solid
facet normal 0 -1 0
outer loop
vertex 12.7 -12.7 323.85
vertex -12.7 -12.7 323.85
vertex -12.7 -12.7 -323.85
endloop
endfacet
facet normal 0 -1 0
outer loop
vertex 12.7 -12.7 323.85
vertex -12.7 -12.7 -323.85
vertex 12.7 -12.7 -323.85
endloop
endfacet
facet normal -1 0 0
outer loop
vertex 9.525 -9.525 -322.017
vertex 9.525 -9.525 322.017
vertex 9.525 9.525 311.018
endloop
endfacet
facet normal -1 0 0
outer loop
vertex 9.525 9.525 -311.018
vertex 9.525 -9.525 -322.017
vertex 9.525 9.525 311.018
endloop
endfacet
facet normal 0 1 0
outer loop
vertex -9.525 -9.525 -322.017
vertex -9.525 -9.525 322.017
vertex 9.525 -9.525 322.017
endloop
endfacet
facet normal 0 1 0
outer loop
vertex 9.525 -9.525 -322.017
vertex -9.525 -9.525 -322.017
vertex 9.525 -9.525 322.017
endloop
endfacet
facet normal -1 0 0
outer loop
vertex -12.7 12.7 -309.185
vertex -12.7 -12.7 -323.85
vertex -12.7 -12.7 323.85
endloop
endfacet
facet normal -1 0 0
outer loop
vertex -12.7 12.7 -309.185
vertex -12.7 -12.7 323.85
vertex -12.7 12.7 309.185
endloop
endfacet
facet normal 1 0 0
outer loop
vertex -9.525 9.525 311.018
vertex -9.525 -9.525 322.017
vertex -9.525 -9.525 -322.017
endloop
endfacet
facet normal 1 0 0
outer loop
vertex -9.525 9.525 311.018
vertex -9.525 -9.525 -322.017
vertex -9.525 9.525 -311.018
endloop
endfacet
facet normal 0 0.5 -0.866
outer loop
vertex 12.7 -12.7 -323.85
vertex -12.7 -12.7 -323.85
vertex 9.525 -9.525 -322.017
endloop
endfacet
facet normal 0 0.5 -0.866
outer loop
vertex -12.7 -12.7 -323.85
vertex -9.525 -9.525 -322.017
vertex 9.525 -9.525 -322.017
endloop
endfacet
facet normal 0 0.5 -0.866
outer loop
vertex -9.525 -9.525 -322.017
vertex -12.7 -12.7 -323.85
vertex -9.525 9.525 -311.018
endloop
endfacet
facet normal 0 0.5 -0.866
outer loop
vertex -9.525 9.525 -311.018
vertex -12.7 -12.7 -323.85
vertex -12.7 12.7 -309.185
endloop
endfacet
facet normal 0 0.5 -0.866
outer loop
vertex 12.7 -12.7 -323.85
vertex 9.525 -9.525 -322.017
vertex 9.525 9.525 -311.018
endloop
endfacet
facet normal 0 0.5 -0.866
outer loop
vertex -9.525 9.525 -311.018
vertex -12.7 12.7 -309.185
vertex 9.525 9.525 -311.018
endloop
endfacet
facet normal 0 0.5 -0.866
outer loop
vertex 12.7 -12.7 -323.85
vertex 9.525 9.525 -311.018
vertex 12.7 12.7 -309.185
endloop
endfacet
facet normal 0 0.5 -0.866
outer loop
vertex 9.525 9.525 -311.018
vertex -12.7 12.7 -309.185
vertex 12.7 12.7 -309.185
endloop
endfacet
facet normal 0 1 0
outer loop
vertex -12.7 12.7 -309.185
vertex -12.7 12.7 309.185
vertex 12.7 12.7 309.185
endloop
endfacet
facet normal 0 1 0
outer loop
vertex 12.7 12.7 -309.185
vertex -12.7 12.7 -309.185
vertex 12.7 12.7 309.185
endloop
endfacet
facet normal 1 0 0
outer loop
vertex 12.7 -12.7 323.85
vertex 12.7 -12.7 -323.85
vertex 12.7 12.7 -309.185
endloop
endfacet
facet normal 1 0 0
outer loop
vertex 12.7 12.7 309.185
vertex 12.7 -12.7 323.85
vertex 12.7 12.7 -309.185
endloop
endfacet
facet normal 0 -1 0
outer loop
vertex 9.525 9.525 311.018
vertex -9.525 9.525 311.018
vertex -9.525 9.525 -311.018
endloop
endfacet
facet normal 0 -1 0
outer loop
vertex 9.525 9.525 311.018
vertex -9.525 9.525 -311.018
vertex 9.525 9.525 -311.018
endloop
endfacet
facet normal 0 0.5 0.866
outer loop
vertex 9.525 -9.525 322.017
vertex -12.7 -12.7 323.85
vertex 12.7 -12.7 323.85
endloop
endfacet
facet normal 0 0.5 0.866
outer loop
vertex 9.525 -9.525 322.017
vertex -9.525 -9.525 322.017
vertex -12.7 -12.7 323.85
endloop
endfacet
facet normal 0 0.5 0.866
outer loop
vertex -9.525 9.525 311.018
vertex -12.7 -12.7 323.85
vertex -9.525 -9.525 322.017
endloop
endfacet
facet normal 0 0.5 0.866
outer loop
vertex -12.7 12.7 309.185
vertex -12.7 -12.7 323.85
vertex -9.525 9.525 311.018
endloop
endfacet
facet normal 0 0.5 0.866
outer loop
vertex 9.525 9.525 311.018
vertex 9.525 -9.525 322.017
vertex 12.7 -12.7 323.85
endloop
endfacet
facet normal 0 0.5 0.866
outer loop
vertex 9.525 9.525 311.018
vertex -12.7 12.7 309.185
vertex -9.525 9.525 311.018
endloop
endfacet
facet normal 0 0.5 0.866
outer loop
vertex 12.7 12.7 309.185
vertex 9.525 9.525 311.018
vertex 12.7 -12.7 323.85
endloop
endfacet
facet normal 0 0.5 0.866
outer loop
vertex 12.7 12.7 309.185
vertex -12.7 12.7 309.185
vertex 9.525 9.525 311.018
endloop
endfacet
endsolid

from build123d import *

# Parameters (mm, degrees)
SKETCH1_W           = 25.4
SKETCH1_H           = 25.4
SKETCH1_W_2         = 19.05
SKETCH1_H_2         = 19.05
BOSS_EXTRUDE1_DEPTH = 323.85
SKETCH2_W           = 25.4
SKETCH2_H           = 29.329393675
CUT_EXTRUDE1_DEPTH  = 281.965076789


with BuildPart() as part:
    # Sketch1 → Boss-Extrude1 (new body)
    with BuildSketch(Plane.XY):
        Rectangle(SKETCH1_W, SKETCH1_H)
        Rectangle(SKETCH1_W_2, SKETCH1_H_2, mode=Mode.SUBTRACT)
    boss_extrude1 = extrude(amount=BOSS_EXTRUDE1_DEPTH)

    # Sketch2 → Cut-Extrude1 (cut, through all)
    with BuildSketch(Plane(origin=(0, 137.056163508, 237.388238686), x_dir=(1, 0, 0), z_dir=(0, 0.4999999999999889, 0.866025403784445))):
        with Locations((0, -158.25882579)):
            Rectangle(SKETCH2_W, SKETCH2_H)
    cut_extrude1 = extrude(amount=CUT_EXTRUDE1_DEPTH, mode=Mode.SUBTRACT)

    # Mirror2: Boss-Extrude1, Cut-Extrude1 across plane
    add(boss_extrude1.mirror(Plane.XY))
    add(cut_extrude1.mirror(Plane.XY), mode=Mode.SUBTRACT)


solid = part.part
